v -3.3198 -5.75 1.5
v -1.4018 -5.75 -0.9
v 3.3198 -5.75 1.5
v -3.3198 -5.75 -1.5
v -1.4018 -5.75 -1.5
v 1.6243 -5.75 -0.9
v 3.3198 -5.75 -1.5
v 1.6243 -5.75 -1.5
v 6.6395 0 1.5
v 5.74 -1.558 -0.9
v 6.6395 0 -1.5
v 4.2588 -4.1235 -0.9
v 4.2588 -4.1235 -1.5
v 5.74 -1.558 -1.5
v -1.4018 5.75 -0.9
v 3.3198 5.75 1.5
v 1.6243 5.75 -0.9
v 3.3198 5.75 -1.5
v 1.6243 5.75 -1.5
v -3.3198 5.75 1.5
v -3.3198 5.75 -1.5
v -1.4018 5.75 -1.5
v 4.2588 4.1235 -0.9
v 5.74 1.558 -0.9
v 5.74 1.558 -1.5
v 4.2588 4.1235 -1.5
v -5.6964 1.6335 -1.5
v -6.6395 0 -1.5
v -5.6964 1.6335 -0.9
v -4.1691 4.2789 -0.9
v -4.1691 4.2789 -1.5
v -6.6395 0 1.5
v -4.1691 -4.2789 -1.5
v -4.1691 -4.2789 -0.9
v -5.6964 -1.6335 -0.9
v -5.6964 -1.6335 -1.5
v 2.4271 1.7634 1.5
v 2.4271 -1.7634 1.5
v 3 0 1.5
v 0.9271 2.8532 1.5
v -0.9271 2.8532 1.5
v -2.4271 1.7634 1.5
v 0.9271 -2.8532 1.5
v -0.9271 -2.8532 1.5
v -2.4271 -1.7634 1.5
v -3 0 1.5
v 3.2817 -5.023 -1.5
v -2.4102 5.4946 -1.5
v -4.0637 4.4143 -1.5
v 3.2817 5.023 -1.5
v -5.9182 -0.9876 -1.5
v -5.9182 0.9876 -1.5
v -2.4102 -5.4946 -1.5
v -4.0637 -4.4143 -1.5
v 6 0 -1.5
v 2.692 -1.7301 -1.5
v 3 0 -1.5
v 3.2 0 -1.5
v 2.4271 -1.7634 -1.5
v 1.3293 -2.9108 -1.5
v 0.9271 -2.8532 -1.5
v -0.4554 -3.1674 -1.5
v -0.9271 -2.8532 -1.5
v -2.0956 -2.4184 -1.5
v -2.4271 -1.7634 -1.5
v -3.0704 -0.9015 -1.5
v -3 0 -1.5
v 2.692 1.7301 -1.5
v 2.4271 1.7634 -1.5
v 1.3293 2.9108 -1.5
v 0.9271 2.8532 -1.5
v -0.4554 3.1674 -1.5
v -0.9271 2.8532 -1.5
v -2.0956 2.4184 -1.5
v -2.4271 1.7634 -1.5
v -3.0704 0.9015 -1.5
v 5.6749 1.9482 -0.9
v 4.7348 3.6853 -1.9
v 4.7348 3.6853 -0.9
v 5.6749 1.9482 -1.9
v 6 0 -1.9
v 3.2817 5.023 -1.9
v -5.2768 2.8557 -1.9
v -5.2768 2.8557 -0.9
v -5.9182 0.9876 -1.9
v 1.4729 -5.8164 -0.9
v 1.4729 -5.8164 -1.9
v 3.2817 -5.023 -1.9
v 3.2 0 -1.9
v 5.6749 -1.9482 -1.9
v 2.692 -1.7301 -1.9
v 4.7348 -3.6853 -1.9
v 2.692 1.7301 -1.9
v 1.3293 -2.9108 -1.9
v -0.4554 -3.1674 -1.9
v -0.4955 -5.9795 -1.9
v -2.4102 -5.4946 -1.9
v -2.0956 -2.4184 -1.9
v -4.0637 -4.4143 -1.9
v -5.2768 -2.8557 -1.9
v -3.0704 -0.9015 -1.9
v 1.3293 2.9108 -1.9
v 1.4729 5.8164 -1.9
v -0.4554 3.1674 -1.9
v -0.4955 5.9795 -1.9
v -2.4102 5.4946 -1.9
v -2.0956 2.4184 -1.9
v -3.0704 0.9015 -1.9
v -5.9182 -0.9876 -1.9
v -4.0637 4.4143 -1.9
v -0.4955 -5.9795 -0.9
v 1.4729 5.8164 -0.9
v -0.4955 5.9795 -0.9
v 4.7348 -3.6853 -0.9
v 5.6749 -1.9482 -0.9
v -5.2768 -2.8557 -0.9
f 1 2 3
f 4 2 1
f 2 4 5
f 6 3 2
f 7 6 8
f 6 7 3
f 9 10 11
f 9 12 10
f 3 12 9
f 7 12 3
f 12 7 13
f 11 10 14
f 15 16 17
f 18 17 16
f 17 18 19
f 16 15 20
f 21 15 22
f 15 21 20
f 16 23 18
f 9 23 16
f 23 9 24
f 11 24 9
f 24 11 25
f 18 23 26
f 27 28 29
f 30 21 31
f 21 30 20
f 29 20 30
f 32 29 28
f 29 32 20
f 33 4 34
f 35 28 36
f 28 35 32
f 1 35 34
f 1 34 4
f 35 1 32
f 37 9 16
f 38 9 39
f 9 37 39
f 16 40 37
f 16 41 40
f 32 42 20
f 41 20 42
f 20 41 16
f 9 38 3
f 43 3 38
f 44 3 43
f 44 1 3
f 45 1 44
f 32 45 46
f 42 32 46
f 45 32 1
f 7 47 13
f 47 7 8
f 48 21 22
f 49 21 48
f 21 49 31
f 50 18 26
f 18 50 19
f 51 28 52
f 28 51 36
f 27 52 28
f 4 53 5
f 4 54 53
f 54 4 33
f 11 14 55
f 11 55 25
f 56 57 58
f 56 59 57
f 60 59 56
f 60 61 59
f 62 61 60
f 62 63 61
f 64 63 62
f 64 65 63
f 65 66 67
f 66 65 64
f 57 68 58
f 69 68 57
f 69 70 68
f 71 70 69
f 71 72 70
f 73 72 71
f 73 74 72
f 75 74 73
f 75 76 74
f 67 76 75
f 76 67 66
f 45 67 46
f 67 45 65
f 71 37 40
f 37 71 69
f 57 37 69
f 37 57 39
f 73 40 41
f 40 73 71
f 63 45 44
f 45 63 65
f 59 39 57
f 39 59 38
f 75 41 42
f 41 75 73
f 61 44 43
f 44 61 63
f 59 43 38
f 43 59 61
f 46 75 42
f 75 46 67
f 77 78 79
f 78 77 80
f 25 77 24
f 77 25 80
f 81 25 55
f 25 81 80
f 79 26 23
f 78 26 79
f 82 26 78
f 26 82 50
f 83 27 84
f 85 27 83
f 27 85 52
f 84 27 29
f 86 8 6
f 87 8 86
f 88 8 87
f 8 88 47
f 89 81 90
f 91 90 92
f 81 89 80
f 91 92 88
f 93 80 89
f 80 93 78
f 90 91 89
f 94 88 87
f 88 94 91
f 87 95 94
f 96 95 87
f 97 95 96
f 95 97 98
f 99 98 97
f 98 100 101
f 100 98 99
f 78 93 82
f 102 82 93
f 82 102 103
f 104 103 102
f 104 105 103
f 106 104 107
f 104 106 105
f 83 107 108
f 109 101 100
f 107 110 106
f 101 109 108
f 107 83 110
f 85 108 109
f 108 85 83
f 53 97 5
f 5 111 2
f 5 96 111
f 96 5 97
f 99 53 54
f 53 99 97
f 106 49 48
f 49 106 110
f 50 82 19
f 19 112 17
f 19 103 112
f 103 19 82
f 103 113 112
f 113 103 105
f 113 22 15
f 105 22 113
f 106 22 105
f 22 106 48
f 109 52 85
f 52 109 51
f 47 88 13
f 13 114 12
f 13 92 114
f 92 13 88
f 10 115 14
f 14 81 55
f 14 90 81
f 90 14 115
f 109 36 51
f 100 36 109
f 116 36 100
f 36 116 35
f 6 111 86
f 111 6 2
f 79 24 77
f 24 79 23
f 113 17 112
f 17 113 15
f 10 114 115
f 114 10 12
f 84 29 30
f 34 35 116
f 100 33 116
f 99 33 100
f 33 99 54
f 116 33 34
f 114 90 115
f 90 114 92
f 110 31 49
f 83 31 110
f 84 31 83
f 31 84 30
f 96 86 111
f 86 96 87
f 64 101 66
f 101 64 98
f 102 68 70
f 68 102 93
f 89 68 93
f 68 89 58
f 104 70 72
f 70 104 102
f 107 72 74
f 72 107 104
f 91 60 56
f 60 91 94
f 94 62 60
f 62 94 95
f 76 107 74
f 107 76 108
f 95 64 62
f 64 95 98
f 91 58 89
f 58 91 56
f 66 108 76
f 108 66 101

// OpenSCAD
// Parameters
thread_nominal_diameter_mm = 6.0; //[3.0:12.0:0.1]
across_flats_mm = 11.5; //[6.0:23.0:0.1]
thickness_mm = 3.0; //[1.5:6.0:0.1]
hole_diameter_mm = 6.0; //[5.0:7.5:0.05]
profile_sides = 6; //[6:6:1]
chamfer_top_mm = 0.0; //[0.0:1.5:0.1]
chamfer_bottom_mm = 0.0; //[0.0:1.5:0.1]
eps_mm = 0.6; //[0.2:2.0:0.1]
washer_outer_diameter_mm = 12.0; //[8.0:24.0:0.1]
washer_thickness_mm = 1.0; //[0.5:3.0:0.1]
washer_hole_diameter_mm = 6.4; //[6.0:8.0:0.05]

// M6 Half Nut - complete geometry
module nut() {
  color("DimGray") {
    difference() {
      // Hex nut body
      cylinder(r=across_flats_mm/(2*cos(30)), h=thickness_mm, center=true, $fn=profile_sides);
      // Central through hole
      cylinder(r=hole_diameter_mm/2, h=thickness_mm + 2*eps_mm, center=true);
    }
  }
}

// Nut and Washer - complete geometry
module nut_and_washer() {
  union() {
    nut();
    translate([0, 0, -(thickness_mm/2 + washer_thickness_mm/2 - eps_mm)]) {
      color("Silver") {
        difference() {
          // Washer outer
          cylinder(r=washer_outer_diameter_mm/2, h=washer_thickness_mm, center=true);
          // Washer hole
          cylinder(r=washer_hole_diameter_mm/2, h=washer_thickness_mm + 2*eps_mm, center=true);
        }
      }
    }
  }
}

// Assembly
module assembly() {
  nut_and_washer();
}

assembly();
